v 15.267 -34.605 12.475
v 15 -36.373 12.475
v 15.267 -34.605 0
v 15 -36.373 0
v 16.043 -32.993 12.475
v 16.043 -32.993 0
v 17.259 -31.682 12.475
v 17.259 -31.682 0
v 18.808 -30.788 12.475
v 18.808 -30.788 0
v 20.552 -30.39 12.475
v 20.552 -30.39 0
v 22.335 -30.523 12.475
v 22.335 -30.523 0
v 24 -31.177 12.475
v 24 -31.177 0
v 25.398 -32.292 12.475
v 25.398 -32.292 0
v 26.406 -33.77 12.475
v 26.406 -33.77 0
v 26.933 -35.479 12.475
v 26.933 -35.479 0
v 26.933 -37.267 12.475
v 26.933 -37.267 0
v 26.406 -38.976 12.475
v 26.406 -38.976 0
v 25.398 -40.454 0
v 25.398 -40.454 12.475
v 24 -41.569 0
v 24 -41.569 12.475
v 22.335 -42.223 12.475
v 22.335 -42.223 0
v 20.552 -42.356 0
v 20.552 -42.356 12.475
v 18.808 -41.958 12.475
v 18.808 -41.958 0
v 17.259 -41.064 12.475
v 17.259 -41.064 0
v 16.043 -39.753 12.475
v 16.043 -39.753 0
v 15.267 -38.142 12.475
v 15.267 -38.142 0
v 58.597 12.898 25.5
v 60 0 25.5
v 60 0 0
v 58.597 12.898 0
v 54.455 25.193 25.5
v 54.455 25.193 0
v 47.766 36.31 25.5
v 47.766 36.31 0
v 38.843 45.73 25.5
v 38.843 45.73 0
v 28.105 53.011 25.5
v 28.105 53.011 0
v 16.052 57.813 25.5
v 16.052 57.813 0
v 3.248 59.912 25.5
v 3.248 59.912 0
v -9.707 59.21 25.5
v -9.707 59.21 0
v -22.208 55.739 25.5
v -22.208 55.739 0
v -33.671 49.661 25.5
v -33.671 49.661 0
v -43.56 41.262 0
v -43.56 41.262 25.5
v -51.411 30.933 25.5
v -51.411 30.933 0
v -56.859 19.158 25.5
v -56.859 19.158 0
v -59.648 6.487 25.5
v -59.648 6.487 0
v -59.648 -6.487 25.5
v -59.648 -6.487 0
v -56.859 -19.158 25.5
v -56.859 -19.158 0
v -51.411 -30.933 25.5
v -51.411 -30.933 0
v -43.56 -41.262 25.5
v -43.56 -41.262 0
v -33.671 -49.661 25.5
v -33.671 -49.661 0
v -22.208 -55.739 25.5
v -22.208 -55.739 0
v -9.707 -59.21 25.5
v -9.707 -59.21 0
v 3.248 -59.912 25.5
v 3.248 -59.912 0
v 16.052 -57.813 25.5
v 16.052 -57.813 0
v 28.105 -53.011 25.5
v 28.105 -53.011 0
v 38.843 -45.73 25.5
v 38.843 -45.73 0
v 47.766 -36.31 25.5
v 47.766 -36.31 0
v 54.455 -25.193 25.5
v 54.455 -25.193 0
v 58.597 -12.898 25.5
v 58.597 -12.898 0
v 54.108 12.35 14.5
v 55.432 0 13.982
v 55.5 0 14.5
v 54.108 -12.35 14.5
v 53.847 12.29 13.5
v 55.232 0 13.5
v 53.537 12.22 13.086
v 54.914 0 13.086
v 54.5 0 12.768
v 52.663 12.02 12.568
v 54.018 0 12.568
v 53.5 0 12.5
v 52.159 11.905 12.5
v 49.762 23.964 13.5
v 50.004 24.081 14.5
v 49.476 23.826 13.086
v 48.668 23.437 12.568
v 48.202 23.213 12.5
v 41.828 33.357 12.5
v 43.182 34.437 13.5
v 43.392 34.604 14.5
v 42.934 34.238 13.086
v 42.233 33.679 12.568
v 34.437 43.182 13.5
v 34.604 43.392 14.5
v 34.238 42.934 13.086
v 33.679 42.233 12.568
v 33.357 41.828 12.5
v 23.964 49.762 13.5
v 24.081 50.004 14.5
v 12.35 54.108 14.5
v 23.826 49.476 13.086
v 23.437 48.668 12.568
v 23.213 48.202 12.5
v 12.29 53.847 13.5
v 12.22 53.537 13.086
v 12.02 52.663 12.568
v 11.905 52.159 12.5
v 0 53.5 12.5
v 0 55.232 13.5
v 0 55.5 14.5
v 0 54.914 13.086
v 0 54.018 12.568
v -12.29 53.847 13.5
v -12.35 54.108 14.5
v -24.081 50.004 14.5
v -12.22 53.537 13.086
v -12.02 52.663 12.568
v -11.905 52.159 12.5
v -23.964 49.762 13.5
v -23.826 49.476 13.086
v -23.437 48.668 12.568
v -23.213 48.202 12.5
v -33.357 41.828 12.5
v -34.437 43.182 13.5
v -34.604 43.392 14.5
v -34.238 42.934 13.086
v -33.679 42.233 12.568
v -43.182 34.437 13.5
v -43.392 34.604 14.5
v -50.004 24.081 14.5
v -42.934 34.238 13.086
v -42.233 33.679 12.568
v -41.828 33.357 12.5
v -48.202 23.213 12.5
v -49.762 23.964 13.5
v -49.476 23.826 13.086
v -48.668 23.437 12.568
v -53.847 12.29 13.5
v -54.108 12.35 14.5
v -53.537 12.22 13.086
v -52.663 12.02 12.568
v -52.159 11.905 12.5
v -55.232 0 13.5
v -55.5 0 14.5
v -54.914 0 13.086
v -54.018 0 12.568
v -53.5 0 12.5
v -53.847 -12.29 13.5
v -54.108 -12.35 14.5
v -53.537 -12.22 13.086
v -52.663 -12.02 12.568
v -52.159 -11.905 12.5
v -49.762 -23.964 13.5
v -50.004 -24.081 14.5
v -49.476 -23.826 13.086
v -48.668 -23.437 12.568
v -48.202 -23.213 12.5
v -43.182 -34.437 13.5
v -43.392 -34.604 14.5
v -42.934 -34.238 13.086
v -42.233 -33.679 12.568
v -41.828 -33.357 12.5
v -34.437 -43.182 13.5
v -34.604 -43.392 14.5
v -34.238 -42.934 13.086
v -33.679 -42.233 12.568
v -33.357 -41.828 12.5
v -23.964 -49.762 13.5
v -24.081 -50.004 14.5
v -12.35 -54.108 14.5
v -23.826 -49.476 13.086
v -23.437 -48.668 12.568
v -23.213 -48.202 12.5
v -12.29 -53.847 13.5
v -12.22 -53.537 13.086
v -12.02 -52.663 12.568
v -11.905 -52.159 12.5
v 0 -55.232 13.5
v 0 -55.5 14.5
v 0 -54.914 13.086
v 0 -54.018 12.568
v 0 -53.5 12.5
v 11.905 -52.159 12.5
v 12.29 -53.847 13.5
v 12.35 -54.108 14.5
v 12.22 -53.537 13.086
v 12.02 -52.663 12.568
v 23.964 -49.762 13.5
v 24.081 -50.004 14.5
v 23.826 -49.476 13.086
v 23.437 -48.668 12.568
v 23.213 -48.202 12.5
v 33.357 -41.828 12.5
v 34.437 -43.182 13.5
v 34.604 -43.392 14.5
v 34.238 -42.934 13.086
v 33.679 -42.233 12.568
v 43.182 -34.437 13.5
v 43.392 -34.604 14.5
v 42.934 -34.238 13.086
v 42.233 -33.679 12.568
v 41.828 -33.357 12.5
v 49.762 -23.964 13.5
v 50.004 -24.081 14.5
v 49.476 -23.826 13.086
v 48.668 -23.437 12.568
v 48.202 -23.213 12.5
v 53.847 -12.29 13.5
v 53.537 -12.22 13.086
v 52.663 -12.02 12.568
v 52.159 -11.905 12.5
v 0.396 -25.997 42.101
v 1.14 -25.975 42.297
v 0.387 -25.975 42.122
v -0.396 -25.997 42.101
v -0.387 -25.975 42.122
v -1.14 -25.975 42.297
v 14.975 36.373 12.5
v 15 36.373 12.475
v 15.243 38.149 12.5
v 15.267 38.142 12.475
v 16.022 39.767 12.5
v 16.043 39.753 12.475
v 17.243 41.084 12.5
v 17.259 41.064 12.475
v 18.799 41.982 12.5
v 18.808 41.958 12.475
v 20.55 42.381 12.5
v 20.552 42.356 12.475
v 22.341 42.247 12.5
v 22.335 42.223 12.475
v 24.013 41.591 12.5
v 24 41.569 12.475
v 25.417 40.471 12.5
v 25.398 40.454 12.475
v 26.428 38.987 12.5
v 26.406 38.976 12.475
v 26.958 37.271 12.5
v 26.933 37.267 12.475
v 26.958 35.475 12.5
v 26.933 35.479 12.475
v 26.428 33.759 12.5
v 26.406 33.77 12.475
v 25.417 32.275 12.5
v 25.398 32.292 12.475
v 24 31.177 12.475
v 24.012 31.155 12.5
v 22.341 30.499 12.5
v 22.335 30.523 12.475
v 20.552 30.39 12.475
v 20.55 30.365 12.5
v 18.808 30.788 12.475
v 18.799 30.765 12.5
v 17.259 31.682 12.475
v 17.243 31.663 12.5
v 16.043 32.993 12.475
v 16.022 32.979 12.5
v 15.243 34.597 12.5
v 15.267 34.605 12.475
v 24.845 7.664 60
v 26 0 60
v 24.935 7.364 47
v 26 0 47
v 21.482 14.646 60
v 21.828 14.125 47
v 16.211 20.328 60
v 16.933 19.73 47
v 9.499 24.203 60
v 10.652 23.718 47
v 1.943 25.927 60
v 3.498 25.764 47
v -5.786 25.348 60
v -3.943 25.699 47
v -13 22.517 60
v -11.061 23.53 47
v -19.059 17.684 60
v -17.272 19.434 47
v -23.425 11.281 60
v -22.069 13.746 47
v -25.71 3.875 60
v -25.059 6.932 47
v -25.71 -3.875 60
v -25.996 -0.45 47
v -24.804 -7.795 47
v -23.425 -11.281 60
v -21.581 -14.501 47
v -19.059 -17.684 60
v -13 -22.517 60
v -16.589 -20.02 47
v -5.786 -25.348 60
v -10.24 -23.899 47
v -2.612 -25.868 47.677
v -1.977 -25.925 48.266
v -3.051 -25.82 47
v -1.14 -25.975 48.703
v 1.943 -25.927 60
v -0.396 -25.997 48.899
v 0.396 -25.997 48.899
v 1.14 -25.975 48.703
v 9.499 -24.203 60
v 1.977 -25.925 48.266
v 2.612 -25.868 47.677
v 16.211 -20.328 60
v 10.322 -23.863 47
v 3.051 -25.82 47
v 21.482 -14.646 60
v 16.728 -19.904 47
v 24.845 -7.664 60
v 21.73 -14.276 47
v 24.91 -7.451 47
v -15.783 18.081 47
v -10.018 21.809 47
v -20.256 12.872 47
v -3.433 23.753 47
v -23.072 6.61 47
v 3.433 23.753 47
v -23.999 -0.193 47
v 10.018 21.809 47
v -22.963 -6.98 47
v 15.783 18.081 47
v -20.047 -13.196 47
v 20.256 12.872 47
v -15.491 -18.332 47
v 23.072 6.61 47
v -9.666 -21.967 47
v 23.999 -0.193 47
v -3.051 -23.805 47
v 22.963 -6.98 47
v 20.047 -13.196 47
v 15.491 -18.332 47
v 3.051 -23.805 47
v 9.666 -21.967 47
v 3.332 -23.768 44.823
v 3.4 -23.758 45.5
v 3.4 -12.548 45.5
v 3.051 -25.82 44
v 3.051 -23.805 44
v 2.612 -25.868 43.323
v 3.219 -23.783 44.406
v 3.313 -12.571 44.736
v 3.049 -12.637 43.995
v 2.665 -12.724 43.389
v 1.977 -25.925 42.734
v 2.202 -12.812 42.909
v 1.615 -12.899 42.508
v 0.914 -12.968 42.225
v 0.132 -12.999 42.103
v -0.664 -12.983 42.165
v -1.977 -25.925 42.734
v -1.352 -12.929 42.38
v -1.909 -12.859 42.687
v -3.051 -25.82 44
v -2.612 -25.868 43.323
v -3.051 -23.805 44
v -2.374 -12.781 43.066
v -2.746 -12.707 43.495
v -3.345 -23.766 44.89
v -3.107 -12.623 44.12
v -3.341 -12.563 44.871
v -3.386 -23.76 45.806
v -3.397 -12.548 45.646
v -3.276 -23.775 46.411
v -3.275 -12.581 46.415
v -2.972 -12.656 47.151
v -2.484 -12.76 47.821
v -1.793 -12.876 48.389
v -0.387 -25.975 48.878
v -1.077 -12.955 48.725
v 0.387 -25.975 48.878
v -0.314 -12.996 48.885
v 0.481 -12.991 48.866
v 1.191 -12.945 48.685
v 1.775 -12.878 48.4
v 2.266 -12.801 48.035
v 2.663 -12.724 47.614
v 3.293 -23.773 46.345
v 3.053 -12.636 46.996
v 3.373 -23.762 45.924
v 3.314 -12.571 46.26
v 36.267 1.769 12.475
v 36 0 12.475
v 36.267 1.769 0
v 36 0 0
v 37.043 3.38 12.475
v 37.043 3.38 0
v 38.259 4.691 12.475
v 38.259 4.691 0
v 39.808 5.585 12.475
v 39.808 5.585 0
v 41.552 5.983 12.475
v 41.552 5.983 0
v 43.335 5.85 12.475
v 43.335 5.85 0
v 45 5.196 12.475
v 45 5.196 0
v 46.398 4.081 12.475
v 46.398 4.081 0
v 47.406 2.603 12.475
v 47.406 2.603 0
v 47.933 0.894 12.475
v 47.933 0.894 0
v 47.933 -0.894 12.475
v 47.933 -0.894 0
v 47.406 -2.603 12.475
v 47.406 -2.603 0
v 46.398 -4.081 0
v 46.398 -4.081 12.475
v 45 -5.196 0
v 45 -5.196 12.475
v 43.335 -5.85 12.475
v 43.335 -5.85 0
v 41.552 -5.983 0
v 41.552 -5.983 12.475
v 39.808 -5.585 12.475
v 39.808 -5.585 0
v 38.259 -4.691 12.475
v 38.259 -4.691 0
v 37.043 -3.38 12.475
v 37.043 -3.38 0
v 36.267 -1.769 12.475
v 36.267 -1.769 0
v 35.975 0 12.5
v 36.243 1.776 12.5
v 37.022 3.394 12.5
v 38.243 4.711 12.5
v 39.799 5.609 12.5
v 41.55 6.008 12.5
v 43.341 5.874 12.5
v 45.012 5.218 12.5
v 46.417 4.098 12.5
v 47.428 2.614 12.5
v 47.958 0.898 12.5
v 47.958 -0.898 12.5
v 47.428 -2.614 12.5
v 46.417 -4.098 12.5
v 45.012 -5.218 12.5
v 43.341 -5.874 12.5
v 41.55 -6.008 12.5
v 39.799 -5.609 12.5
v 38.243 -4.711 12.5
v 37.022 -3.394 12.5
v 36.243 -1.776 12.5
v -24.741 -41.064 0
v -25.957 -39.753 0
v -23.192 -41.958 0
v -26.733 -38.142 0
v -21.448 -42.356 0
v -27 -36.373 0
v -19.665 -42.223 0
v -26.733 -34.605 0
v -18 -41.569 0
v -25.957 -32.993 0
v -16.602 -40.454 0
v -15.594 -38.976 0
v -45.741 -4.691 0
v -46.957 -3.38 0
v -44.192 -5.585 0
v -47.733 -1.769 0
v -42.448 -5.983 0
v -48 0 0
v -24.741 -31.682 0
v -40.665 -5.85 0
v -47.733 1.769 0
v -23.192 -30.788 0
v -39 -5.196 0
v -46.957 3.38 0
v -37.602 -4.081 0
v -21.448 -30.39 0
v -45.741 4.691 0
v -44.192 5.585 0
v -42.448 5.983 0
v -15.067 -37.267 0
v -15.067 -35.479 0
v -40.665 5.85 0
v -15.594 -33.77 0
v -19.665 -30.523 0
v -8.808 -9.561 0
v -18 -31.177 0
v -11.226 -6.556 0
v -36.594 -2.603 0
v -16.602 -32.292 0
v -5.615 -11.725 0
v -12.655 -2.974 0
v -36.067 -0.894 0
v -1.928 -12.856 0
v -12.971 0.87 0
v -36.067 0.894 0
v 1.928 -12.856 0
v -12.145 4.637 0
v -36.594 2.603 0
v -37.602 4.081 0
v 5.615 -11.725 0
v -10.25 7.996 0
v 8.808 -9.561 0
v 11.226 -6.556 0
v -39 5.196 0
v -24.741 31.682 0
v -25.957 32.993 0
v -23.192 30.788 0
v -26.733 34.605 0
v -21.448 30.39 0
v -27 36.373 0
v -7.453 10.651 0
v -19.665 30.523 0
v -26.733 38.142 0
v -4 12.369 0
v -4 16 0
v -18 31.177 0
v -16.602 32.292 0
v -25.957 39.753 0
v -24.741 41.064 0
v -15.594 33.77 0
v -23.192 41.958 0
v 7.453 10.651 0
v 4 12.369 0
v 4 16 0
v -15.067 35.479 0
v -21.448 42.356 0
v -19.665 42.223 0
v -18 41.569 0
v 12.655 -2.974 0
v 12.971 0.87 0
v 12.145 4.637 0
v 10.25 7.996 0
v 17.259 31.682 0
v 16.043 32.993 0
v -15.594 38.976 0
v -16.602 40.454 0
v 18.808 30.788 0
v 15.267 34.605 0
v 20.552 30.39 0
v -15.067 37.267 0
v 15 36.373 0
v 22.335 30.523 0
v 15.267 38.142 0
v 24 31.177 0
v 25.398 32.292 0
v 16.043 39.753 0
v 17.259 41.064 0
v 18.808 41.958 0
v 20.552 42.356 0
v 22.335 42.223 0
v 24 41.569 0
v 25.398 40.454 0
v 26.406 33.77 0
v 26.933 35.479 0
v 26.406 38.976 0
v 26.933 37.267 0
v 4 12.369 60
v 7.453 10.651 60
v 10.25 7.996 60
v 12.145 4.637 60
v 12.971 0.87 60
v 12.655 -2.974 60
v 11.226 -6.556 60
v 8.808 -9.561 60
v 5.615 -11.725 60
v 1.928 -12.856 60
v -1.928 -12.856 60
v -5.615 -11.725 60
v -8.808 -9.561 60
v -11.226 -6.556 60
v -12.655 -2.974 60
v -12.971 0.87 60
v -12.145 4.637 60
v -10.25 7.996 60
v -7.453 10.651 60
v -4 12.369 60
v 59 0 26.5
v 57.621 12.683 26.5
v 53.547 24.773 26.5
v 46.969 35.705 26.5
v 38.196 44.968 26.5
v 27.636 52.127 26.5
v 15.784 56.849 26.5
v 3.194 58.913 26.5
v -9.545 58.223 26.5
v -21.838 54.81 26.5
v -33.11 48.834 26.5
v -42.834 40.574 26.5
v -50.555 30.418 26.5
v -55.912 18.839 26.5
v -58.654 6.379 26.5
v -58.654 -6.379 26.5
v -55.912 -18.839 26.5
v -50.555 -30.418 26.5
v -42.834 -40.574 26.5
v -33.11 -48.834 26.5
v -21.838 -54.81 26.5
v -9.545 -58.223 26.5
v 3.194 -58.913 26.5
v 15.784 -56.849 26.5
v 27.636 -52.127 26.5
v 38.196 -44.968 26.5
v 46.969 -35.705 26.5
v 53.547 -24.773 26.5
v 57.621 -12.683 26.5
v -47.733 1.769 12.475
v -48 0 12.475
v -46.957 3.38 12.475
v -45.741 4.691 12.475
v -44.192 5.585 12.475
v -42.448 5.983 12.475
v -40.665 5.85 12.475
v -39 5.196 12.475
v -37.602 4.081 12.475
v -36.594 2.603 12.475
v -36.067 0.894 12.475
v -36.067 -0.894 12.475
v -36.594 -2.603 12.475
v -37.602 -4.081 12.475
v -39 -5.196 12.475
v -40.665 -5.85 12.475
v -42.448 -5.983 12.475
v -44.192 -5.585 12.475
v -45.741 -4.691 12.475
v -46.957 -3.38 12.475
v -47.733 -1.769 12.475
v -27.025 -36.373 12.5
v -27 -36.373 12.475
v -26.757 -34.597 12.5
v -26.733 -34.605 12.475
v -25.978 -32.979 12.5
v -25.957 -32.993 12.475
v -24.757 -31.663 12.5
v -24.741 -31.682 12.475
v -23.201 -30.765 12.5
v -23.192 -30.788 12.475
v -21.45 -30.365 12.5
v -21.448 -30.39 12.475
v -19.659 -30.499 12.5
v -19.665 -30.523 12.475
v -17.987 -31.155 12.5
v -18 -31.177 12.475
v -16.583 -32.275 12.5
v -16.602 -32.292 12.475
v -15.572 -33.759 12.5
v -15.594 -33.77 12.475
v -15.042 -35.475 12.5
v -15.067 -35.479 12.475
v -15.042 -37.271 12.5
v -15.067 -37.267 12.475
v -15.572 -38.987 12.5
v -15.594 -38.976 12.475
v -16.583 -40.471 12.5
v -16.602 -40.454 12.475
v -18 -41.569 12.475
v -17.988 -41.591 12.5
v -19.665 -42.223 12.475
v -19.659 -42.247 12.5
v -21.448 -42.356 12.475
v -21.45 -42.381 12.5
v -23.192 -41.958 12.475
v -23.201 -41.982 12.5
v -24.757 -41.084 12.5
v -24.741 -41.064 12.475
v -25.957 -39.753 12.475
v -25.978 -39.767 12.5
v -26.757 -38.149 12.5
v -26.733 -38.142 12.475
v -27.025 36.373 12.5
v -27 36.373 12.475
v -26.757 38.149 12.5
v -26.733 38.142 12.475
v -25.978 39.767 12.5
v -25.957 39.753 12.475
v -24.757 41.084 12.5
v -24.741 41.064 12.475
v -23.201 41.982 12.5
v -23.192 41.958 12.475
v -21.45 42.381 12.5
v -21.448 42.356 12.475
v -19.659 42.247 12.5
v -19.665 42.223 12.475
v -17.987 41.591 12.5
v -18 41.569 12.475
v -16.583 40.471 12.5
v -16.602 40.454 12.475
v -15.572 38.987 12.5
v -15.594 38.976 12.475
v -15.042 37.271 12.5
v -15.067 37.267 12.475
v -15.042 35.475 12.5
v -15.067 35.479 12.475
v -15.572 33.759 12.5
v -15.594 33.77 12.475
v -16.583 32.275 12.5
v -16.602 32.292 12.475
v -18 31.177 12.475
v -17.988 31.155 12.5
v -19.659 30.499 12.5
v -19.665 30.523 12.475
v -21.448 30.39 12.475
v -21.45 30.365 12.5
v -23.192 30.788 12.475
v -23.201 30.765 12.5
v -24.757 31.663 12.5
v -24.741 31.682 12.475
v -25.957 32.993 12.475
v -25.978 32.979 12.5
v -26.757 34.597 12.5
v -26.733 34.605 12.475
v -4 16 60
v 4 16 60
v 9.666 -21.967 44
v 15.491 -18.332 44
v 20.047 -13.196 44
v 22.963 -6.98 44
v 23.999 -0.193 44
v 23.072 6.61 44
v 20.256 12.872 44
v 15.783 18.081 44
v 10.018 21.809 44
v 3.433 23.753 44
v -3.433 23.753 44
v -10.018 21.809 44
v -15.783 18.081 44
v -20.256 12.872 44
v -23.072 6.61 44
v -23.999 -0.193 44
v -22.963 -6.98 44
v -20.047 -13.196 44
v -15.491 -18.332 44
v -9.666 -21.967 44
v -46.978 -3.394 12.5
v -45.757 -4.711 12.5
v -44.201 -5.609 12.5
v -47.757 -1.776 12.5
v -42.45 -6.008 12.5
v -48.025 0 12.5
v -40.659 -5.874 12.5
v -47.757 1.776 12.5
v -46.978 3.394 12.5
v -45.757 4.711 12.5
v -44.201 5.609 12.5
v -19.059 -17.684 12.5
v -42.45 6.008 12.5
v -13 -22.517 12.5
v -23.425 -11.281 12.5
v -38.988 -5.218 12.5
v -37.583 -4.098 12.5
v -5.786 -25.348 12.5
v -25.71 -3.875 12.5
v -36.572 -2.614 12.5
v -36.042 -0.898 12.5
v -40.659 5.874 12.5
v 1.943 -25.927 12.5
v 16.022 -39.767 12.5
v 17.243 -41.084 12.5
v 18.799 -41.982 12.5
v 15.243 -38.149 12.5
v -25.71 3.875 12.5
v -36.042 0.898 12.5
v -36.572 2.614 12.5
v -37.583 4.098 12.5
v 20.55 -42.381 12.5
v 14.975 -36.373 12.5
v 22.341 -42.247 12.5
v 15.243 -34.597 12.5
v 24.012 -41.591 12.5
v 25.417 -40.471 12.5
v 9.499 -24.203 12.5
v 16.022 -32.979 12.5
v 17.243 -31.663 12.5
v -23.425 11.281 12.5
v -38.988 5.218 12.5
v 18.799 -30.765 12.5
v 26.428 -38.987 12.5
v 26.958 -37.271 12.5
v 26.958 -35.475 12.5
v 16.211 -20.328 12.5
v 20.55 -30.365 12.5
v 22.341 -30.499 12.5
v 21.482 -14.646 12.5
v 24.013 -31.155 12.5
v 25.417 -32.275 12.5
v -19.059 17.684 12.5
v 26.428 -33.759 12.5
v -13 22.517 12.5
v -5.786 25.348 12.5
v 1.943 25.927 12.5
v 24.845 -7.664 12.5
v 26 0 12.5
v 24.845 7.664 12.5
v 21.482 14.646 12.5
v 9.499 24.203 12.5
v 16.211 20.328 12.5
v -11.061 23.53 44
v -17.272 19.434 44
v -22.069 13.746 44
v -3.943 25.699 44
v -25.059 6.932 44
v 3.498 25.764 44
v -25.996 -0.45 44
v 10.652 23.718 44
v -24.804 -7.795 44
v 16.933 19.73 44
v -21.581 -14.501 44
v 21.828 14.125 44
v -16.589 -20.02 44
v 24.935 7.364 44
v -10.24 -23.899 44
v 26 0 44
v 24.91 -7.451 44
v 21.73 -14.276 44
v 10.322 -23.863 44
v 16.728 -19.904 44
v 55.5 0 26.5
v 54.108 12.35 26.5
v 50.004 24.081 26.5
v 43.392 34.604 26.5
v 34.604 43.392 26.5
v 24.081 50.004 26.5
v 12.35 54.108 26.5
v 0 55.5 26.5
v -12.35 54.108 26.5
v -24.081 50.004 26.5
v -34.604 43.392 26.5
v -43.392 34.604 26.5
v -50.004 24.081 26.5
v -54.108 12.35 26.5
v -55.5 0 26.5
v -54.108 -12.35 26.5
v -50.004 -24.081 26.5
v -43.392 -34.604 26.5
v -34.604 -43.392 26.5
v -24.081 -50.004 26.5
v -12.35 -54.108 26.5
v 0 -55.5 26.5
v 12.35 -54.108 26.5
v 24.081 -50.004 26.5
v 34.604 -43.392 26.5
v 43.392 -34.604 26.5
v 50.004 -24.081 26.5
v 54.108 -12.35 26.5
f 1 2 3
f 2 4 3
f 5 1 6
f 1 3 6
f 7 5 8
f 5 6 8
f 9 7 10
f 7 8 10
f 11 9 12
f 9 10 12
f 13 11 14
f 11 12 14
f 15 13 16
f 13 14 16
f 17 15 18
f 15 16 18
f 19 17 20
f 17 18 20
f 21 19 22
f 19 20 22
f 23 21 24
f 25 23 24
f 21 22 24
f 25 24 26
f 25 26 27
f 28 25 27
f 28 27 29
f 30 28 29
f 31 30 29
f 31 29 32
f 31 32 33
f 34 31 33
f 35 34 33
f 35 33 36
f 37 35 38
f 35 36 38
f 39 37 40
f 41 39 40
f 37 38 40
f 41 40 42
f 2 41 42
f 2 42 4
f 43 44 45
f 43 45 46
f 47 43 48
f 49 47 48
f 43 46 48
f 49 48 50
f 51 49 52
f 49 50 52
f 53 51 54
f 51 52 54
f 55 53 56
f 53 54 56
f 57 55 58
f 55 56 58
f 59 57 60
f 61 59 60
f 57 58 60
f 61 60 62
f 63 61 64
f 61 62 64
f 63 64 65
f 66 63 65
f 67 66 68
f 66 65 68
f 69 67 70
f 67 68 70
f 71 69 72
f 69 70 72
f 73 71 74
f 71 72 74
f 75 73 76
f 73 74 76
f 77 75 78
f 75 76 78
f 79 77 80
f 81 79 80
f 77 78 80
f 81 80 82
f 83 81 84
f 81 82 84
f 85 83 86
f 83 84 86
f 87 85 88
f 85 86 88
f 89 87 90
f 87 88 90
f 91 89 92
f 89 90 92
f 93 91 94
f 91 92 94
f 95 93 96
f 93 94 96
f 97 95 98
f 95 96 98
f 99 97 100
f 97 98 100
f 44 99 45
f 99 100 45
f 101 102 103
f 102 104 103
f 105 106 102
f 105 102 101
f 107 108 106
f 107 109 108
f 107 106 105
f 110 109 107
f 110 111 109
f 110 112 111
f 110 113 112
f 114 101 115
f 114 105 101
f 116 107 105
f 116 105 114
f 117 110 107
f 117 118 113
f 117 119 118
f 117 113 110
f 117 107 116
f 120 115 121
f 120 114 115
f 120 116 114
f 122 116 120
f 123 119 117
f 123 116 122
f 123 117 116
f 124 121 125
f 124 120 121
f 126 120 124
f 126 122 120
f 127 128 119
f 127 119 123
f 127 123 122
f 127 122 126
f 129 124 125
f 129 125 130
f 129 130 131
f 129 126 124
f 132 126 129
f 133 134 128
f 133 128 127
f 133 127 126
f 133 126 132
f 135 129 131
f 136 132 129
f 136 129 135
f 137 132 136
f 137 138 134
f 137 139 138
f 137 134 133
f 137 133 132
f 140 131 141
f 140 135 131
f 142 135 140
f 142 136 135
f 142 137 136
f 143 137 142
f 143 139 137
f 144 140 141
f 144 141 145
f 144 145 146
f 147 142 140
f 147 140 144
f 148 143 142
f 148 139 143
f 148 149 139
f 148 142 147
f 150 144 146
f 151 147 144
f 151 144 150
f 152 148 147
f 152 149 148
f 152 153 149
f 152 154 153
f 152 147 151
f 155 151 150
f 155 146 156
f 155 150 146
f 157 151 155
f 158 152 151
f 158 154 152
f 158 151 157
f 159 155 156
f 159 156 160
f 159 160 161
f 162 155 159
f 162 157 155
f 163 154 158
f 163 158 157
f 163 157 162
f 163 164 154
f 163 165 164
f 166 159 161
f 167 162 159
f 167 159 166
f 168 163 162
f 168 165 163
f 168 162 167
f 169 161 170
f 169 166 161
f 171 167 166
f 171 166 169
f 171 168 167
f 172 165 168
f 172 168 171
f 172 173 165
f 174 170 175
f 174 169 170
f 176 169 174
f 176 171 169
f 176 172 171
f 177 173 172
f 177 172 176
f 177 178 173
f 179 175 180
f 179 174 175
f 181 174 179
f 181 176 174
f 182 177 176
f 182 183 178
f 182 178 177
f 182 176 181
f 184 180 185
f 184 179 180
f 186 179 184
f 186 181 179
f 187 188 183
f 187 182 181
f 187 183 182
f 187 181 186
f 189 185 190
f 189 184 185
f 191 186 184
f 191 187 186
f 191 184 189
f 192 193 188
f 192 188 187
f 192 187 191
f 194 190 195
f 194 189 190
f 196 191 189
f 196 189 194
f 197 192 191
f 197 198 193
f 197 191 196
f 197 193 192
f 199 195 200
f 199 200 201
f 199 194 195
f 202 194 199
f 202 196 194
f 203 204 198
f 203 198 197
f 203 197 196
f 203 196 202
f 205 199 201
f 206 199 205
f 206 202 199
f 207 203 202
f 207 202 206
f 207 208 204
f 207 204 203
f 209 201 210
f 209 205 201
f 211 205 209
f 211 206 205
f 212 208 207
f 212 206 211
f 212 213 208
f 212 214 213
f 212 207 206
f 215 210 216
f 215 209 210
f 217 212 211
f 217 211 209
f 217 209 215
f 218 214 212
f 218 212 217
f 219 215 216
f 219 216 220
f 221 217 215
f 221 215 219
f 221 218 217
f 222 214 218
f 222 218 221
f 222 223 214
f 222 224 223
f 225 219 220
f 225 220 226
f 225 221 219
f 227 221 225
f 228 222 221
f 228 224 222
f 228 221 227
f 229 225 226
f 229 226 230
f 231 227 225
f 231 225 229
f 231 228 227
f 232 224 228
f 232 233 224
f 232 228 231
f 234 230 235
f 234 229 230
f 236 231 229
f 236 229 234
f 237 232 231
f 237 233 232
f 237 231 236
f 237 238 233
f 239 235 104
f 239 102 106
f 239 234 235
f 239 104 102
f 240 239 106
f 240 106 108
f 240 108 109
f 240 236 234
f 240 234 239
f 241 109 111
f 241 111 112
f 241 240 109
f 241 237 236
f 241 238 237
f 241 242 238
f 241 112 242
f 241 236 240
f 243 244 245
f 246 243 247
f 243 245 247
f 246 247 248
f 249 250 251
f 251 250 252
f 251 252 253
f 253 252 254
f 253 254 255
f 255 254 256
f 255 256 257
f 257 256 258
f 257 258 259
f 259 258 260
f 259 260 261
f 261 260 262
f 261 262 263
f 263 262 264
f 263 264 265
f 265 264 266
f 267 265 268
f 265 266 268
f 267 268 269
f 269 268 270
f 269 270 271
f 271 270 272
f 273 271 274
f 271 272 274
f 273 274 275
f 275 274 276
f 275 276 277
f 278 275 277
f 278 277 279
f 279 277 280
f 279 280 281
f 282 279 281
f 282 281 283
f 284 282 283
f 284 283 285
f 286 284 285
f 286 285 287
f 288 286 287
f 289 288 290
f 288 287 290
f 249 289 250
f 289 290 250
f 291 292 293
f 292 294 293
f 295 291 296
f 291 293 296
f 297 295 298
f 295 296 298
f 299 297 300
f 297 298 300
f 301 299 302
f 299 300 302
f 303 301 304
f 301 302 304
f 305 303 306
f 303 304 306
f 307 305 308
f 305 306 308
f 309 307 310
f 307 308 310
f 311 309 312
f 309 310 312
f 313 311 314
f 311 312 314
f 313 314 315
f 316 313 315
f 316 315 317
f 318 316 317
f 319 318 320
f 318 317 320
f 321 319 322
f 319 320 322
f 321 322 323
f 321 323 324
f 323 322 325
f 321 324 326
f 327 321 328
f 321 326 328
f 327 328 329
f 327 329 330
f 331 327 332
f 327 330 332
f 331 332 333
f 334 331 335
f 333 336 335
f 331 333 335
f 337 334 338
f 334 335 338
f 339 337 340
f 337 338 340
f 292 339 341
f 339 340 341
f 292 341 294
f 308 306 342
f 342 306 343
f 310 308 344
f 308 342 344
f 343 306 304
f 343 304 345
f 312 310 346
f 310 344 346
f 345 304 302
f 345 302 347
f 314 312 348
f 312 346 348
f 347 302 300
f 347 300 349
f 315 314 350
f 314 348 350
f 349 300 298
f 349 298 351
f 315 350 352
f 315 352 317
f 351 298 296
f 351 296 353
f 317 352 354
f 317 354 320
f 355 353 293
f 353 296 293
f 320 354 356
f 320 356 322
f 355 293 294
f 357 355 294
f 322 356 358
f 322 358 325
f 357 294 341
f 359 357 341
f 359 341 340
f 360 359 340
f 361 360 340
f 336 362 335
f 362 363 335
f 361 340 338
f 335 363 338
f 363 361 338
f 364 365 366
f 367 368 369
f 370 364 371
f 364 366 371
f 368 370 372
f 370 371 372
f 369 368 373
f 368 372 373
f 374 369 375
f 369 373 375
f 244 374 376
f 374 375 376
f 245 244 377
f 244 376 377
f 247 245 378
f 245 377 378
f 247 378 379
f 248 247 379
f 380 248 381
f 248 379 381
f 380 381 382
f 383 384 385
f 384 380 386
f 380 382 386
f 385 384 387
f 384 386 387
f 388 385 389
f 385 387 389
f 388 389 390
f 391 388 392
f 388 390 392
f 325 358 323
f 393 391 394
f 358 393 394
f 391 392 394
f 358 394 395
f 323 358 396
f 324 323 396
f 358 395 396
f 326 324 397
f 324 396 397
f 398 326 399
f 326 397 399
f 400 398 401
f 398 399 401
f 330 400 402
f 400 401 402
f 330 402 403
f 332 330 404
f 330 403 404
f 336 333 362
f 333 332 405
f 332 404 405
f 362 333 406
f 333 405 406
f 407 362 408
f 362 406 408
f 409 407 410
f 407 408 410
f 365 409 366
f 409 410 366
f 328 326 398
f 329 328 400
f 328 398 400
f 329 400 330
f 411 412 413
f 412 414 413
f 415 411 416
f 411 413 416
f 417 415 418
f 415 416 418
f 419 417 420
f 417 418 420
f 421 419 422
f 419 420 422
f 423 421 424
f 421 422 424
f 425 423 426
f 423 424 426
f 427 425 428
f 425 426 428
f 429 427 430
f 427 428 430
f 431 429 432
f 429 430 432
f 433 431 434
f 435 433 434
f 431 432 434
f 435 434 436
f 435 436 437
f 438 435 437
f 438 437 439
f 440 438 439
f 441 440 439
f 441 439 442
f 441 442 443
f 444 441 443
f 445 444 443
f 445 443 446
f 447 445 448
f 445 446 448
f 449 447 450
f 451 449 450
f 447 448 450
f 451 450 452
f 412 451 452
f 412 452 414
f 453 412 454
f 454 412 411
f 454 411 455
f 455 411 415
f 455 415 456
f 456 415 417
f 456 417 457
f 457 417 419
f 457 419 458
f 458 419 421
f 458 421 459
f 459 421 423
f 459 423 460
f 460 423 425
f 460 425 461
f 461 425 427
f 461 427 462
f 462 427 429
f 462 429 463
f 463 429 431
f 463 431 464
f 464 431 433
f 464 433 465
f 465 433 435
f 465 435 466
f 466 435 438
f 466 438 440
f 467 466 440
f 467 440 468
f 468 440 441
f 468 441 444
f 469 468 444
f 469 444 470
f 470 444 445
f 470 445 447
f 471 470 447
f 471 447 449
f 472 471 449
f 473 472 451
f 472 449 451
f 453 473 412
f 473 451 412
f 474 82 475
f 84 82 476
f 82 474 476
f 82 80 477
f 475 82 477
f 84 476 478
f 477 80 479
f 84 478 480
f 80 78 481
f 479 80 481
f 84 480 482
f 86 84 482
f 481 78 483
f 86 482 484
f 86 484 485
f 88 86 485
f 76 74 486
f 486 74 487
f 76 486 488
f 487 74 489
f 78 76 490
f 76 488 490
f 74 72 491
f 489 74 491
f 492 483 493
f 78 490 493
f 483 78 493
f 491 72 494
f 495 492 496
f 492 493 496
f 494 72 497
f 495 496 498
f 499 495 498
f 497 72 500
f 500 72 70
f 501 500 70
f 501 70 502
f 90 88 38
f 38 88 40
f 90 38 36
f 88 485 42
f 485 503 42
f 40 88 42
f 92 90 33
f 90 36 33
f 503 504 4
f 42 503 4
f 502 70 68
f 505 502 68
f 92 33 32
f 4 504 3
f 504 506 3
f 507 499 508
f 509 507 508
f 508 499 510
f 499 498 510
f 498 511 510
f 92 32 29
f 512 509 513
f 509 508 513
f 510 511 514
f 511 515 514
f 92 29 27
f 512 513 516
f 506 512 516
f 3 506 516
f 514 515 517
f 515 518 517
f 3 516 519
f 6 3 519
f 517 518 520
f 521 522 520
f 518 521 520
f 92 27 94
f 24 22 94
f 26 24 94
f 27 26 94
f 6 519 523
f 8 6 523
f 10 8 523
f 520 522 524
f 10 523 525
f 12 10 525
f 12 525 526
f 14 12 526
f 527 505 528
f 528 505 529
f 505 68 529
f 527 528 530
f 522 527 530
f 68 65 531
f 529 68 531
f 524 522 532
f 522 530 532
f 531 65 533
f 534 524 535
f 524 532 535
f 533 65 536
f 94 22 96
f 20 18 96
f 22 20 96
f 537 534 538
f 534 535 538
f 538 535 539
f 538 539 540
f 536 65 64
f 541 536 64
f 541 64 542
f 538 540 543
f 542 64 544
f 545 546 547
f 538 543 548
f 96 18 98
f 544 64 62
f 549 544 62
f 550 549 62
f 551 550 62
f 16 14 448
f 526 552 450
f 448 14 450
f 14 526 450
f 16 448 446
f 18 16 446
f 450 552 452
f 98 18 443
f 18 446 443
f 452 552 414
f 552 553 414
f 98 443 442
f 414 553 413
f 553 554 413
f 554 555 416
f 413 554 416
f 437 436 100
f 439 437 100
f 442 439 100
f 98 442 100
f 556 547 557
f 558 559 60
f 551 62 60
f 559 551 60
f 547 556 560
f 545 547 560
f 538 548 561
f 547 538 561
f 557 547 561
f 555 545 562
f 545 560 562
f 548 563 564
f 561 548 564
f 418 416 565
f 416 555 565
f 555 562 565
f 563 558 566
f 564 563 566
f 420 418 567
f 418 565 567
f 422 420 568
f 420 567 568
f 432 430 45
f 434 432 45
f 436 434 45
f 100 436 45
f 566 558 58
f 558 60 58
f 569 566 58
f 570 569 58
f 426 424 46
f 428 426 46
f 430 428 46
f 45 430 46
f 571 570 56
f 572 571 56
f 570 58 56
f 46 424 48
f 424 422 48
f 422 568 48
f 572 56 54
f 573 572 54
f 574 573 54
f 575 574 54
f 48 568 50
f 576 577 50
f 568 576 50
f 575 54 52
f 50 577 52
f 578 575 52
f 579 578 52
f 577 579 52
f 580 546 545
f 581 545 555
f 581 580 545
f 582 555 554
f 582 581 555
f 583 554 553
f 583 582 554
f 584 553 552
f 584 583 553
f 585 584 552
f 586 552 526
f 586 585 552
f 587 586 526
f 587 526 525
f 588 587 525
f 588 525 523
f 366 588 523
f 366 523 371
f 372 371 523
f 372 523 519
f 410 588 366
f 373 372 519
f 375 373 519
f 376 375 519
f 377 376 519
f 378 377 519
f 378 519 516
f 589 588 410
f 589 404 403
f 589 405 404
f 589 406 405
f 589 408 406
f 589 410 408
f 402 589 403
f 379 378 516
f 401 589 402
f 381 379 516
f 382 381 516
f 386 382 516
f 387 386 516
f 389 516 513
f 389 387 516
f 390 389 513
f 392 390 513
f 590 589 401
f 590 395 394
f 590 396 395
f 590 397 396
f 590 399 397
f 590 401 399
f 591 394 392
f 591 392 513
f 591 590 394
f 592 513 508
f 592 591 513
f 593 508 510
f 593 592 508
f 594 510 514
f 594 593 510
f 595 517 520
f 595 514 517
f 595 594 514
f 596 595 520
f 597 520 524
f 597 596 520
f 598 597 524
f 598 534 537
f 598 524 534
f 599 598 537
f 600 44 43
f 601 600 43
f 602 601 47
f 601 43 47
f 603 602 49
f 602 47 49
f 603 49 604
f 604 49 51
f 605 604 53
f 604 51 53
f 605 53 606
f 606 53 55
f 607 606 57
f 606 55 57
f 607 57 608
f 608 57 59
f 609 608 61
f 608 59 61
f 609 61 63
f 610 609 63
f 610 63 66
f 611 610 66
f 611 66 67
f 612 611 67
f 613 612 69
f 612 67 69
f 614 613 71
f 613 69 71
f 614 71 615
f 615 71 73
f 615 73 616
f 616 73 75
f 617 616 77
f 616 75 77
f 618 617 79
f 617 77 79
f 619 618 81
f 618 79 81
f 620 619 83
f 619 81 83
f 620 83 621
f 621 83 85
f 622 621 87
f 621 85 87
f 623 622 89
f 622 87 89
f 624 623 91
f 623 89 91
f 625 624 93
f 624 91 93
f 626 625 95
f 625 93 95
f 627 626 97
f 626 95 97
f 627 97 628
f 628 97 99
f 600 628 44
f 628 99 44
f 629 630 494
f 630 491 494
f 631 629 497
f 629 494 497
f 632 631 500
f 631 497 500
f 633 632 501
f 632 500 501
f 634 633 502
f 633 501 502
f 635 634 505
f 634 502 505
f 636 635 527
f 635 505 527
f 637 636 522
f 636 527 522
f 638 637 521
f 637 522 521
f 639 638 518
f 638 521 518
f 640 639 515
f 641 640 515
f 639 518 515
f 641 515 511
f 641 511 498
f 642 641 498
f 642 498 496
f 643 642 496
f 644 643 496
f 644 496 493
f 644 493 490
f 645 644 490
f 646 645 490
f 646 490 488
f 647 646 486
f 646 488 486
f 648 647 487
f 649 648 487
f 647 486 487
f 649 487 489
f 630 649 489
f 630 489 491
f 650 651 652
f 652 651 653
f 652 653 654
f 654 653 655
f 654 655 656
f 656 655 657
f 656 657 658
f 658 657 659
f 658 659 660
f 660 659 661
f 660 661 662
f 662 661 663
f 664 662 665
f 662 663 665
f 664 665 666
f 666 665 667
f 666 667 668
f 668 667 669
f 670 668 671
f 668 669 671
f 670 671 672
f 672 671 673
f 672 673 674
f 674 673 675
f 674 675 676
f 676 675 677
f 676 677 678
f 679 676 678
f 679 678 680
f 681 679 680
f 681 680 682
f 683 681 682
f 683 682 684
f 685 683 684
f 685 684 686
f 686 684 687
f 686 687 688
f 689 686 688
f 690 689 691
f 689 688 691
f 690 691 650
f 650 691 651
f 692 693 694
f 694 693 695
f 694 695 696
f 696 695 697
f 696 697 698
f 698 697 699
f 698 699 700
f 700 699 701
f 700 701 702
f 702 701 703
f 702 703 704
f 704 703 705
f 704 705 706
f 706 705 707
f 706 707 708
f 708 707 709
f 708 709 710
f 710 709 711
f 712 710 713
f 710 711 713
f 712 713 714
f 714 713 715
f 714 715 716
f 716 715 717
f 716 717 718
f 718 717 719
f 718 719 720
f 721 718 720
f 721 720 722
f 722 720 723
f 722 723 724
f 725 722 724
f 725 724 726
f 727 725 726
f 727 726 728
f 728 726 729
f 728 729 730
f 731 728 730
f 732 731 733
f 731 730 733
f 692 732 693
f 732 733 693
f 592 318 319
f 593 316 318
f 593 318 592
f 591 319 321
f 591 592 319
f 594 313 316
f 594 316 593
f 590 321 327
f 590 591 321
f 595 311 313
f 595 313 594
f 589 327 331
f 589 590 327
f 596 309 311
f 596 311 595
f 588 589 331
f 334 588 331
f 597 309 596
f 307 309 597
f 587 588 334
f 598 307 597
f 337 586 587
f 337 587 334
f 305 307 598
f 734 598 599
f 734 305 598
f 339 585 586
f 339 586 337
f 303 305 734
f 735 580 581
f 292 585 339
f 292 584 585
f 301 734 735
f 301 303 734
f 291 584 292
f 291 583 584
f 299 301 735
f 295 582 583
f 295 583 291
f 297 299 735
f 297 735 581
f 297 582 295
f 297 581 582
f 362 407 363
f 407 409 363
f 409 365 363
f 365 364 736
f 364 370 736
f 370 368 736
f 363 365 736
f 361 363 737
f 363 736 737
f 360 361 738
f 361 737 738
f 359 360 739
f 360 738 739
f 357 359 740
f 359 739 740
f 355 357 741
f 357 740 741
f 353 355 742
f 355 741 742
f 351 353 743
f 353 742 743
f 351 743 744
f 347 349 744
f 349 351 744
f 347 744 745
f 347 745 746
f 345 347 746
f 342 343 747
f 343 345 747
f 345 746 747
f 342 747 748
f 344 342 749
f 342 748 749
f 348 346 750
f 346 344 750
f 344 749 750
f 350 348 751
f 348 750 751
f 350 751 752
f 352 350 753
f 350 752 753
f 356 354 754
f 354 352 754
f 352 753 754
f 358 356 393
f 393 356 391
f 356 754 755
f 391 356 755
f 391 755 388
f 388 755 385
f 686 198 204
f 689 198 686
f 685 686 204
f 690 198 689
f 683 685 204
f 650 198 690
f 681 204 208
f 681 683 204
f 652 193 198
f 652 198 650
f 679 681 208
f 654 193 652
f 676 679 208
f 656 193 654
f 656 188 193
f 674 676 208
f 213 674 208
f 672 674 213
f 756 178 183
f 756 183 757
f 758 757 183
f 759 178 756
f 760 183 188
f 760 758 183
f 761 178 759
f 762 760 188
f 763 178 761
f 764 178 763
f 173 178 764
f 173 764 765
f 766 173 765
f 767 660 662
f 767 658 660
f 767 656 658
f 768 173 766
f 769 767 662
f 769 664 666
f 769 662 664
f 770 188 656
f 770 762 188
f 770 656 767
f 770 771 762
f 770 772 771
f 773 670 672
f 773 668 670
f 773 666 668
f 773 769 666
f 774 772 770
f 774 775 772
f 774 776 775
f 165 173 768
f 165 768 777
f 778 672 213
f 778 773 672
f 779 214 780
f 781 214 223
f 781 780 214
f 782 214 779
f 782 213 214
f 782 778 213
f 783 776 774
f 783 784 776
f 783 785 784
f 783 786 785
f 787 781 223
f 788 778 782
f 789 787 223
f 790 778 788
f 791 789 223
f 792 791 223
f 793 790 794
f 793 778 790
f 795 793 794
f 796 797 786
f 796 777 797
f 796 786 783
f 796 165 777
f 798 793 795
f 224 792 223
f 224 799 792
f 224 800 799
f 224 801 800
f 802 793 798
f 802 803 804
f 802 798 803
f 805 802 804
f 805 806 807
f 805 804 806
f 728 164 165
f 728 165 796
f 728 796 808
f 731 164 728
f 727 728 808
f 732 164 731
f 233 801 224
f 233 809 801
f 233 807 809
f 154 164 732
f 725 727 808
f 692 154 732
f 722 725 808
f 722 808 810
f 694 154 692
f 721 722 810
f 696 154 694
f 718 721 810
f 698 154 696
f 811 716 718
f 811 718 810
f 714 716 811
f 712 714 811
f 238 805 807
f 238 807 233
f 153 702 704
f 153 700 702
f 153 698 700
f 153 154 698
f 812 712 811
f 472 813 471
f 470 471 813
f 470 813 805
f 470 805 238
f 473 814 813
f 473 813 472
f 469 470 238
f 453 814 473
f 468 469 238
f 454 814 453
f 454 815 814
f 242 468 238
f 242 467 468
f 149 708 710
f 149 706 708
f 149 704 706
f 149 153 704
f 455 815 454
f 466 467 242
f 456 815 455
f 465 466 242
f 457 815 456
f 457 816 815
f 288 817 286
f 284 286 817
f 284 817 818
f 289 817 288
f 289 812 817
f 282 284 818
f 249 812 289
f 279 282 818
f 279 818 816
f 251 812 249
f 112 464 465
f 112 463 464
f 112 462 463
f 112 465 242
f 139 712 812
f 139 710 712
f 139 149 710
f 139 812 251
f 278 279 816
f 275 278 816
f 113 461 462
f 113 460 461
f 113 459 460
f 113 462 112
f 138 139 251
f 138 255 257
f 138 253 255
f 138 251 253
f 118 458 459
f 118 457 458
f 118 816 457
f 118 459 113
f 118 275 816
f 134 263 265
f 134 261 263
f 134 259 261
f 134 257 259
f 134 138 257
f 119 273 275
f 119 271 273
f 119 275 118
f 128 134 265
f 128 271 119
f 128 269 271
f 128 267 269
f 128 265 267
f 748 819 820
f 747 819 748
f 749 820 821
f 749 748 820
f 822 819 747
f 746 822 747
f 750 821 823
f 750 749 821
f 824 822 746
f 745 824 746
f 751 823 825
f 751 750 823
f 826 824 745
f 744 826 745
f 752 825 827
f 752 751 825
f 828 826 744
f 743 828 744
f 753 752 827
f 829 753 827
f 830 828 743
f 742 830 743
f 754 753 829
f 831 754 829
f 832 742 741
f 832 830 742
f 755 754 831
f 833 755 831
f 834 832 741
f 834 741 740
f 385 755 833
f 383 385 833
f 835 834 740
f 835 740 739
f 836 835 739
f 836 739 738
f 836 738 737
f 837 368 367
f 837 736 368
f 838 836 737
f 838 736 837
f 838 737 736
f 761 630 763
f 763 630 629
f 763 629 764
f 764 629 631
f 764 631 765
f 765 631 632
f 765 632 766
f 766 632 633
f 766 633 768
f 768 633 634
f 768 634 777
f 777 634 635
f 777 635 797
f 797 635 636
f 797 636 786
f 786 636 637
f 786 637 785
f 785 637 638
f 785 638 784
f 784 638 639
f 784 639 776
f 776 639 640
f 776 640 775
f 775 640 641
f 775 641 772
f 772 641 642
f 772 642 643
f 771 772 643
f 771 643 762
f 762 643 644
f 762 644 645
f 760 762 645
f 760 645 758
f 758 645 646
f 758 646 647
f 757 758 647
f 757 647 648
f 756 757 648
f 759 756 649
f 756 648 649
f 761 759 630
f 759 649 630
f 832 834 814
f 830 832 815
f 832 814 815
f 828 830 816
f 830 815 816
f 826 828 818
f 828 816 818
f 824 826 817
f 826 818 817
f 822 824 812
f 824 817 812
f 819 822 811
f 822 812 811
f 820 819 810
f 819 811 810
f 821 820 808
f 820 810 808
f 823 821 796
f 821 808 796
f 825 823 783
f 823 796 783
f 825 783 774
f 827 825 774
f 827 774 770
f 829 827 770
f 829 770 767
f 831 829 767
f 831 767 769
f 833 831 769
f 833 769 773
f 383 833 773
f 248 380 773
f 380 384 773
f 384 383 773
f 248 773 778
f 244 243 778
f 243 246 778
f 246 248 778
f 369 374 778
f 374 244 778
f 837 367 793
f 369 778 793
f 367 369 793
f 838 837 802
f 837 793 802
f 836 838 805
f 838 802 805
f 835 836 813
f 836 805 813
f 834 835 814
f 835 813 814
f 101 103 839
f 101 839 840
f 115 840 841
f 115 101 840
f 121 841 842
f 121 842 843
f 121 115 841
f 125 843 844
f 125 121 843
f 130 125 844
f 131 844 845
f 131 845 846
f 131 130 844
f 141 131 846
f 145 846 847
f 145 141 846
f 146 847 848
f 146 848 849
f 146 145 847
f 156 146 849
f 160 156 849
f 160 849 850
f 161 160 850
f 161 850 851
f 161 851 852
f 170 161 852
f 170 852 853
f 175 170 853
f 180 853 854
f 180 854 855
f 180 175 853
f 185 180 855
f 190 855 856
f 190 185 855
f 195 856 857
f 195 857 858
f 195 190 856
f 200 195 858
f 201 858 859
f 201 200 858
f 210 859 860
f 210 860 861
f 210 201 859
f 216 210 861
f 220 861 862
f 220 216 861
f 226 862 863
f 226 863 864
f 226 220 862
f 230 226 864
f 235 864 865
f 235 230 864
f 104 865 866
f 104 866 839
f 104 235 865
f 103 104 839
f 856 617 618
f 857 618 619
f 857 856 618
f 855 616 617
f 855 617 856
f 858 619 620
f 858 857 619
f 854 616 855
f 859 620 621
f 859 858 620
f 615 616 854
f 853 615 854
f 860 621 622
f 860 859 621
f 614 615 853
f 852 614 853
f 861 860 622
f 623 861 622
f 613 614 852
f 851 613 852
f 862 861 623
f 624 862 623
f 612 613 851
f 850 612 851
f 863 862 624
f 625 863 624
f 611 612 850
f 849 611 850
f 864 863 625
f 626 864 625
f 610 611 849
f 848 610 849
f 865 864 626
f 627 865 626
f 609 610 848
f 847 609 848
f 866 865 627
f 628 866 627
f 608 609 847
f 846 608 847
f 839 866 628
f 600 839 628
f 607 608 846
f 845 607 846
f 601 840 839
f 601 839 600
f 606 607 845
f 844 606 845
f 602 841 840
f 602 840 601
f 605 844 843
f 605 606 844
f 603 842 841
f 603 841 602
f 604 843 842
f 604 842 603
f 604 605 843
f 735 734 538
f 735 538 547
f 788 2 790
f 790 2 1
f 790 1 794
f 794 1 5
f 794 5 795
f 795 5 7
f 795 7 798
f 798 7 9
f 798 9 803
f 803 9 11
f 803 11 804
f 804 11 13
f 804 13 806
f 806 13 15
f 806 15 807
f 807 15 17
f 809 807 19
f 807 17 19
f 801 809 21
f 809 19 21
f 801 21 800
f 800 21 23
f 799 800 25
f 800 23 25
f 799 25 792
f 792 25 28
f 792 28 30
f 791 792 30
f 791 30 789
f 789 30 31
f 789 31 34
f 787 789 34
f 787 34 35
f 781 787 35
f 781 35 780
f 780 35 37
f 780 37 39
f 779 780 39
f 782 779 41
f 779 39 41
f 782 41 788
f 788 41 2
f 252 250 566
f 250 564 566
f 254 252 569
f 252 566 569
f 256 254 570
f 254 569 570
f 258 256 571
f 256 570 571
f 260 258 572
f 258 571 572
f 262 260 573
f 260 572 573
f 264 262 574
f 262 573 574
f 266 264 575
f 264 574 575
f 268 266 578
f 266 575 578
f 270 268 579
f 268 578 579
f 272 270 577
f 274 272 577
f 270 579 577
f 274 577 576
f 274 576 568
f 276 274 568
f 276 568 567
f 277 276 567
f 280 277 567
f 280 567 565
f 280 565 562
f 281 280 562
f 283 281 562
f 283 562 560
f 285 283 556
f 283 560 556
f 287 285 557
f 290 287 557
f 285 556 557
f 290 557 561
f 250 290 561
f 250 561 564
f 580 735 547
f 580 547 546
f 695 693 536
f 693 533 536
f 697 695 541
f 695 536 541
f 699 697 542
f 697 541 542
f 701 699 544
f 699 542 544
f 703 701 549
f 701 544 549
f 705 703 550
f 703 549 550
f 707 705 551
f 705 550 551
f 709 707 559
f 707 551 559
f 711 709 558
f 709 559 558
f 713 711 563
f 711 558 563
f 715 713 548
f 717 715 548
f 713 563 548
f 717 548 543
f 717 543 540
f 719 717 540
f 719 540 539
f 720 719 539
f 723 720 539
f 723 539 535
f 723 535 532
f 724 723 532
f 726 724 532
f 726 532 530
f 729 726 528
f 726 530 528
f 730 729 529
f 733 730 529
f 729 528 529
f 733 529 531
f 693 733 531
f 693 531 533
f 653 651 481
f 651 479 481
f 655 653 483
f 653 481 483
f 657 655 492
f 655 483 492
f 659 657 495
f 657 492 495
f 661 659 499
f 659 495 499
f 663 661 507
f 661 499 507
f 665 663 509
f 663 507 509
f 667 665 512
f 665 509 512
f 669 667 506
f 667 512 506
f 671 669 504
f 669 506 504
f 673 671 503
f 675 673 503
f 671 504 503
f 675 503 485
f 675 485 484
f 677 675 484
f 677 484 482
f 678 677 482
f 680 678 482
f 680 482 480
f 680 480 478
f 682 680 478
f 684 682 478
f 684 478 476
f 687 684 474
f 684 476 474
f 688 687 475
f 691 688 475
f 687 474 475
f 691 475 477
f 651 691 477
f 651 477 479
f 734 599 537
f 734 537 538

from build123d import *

# Parameters (mm, degrees)
SKETCH_1_R                        = 60
EXTRUDE_1_DEPTH                   = 26.5
SKETCH_2_R                        = 26
EXTRUDE_2_DEPTH                   = 60
CUT_EXTRUDE_START                 = -14
SKETCH_3_R                        = 55.5
SKETCH_3_R_2                      = 26
CUT_EXTRUDE_1_DEPTH               = 14
CUT_EXTRUDE_2_DEPTH               = 104.923048454
CUT_EXTRUDE_START_2               = -16
SKETCH_5_R                        = 26
SKETCH_5_R_2                      = 24
CUT_EXTRUDE_3_DEPTH               = 3
HOLE_WIZARD_12_0_12_1_D           = 12
HOLE_WIZARD_12_0_12_1_CSINK_D     = 12.05
HOLE_WIZARD_12_0_12_1_CSINK_ANGLE = 90
CHAMFER_1_SIZE                    = 1
FILLET_1_R                        = 2


# Read off the part's stored shape, not the designer's step: M8 螺纹孔的螺纹孔钻头1
with BuildPart() as part:
    # 草图1 → 凸台-拉伸1 (new body)
    with BuildSketch(Plane.XY):
        Circle(SKETCH_1_R)
    extrude(amount=EXTRUDE_1_DEPTH)

    # 草图2 → 凸台-拉伸2 (add)
    with BuildSketch(Plane.XY):
        Circle(SKETCH_2_R)
    extrude(amount=EXTRUDE_2_DEPTH)

    # 草图3 → 切除-拉伸1 (cut)
    with BuildSketch(Plane.XY.offset(26.5).offset(CUT_EXTRUDE_START)):
        Circle(SKETCH_3_R)
        Circle(SKETCH_3_R_2, mode=Mode.SUBTRACT)
    extrude(amount=CUT_EXTRUDE_1_DEPTH, mode=Mode.SUBTRACT)

    # 草图4 → 切除-拉伸2 (cut, through all)
    with BuildSketch(Plane.XY.offset(60)):
        with BuildLine():
            Line((-4, 12.369316877), (-4, 16))
            Line((-4, 16), (4, 16))
            Line((4, 16), (4, 12.369316877))
            ThreePointArc((4, 12.369316877), (0, -13), (-4, 12.369316877))
        make_face()
    extrude(amount=-CUT_EXTRUDE_2_DEPTH, mode=Mode.SUBTRACT)

    # M8 螺纹孔的螺纹孔钻头1 outline → M8 螺纹孔的螺纹孔钻头1 (revolve, cut)
    with BuildSketch(Plane.XY.offset(45.5)):
        Polygon((0, -26.000014008), (3.425014008, -26.000014008), (3.399999801, -25.974999801), (3.4, -12.54744384), (0, -12.54744384), align=None)
    revolve(axis=Axis((0, 0, 45.5), (0, 1, 0)), mode=Mode.SUBTRACT)

    # 草图5 → 切除-拉伸3 (cut)
    with BuildSketch(Plane.XY.offset(60).offset(CUT_EXTRUDE_START_2)):
        with Locations(Location((0, 0, 0), (0, 0, 263.260542122))):
            Circle(SKETCH_5_R)
        Circle(SKETCH_5_R_2, mode=Mode.SUBTRACT)
    extrude(amount=CUT_EXTRUDE_3_DEPTH, mode=Mode.SUBTRACT)

    # Ø12.0 (12) 直径孔1 (through all)
    with Locations(Plane.XY.offset(12.5)):
        with Locations((21, 36.373066959), (42, 0), (21, -36.373066959), (-21, -36.373066959), (-42, 0), (-21, 36.373066959)):
            CounterSinkHole(HOLE_WIZARD_12_0_12_1_D / 2, HOLE_WIZARD_12_0_12_1_CSINK_D / 2, counter_sink_angle=HOLE_WIZARD_12_0_12_1_CSINK_ANGLE)

    # 倒角1
    chamfer_1_edges = [part.edges().sort_by_distance(p)[0] for p in [
        (-60, 0, 26.5),
    ]]
    chamfer(chamfer_1_edges, length=CHAMFER_1_SIZE)

    # 圆角1
    fillet_1_edges = [part.edges().sort_by_distance(p)[0] for p in [
        (-55.5, 0, 12.5),
    ]]
    fillet(fillet_1_edges, radius=FILLET_1_R)


solid = part.part
